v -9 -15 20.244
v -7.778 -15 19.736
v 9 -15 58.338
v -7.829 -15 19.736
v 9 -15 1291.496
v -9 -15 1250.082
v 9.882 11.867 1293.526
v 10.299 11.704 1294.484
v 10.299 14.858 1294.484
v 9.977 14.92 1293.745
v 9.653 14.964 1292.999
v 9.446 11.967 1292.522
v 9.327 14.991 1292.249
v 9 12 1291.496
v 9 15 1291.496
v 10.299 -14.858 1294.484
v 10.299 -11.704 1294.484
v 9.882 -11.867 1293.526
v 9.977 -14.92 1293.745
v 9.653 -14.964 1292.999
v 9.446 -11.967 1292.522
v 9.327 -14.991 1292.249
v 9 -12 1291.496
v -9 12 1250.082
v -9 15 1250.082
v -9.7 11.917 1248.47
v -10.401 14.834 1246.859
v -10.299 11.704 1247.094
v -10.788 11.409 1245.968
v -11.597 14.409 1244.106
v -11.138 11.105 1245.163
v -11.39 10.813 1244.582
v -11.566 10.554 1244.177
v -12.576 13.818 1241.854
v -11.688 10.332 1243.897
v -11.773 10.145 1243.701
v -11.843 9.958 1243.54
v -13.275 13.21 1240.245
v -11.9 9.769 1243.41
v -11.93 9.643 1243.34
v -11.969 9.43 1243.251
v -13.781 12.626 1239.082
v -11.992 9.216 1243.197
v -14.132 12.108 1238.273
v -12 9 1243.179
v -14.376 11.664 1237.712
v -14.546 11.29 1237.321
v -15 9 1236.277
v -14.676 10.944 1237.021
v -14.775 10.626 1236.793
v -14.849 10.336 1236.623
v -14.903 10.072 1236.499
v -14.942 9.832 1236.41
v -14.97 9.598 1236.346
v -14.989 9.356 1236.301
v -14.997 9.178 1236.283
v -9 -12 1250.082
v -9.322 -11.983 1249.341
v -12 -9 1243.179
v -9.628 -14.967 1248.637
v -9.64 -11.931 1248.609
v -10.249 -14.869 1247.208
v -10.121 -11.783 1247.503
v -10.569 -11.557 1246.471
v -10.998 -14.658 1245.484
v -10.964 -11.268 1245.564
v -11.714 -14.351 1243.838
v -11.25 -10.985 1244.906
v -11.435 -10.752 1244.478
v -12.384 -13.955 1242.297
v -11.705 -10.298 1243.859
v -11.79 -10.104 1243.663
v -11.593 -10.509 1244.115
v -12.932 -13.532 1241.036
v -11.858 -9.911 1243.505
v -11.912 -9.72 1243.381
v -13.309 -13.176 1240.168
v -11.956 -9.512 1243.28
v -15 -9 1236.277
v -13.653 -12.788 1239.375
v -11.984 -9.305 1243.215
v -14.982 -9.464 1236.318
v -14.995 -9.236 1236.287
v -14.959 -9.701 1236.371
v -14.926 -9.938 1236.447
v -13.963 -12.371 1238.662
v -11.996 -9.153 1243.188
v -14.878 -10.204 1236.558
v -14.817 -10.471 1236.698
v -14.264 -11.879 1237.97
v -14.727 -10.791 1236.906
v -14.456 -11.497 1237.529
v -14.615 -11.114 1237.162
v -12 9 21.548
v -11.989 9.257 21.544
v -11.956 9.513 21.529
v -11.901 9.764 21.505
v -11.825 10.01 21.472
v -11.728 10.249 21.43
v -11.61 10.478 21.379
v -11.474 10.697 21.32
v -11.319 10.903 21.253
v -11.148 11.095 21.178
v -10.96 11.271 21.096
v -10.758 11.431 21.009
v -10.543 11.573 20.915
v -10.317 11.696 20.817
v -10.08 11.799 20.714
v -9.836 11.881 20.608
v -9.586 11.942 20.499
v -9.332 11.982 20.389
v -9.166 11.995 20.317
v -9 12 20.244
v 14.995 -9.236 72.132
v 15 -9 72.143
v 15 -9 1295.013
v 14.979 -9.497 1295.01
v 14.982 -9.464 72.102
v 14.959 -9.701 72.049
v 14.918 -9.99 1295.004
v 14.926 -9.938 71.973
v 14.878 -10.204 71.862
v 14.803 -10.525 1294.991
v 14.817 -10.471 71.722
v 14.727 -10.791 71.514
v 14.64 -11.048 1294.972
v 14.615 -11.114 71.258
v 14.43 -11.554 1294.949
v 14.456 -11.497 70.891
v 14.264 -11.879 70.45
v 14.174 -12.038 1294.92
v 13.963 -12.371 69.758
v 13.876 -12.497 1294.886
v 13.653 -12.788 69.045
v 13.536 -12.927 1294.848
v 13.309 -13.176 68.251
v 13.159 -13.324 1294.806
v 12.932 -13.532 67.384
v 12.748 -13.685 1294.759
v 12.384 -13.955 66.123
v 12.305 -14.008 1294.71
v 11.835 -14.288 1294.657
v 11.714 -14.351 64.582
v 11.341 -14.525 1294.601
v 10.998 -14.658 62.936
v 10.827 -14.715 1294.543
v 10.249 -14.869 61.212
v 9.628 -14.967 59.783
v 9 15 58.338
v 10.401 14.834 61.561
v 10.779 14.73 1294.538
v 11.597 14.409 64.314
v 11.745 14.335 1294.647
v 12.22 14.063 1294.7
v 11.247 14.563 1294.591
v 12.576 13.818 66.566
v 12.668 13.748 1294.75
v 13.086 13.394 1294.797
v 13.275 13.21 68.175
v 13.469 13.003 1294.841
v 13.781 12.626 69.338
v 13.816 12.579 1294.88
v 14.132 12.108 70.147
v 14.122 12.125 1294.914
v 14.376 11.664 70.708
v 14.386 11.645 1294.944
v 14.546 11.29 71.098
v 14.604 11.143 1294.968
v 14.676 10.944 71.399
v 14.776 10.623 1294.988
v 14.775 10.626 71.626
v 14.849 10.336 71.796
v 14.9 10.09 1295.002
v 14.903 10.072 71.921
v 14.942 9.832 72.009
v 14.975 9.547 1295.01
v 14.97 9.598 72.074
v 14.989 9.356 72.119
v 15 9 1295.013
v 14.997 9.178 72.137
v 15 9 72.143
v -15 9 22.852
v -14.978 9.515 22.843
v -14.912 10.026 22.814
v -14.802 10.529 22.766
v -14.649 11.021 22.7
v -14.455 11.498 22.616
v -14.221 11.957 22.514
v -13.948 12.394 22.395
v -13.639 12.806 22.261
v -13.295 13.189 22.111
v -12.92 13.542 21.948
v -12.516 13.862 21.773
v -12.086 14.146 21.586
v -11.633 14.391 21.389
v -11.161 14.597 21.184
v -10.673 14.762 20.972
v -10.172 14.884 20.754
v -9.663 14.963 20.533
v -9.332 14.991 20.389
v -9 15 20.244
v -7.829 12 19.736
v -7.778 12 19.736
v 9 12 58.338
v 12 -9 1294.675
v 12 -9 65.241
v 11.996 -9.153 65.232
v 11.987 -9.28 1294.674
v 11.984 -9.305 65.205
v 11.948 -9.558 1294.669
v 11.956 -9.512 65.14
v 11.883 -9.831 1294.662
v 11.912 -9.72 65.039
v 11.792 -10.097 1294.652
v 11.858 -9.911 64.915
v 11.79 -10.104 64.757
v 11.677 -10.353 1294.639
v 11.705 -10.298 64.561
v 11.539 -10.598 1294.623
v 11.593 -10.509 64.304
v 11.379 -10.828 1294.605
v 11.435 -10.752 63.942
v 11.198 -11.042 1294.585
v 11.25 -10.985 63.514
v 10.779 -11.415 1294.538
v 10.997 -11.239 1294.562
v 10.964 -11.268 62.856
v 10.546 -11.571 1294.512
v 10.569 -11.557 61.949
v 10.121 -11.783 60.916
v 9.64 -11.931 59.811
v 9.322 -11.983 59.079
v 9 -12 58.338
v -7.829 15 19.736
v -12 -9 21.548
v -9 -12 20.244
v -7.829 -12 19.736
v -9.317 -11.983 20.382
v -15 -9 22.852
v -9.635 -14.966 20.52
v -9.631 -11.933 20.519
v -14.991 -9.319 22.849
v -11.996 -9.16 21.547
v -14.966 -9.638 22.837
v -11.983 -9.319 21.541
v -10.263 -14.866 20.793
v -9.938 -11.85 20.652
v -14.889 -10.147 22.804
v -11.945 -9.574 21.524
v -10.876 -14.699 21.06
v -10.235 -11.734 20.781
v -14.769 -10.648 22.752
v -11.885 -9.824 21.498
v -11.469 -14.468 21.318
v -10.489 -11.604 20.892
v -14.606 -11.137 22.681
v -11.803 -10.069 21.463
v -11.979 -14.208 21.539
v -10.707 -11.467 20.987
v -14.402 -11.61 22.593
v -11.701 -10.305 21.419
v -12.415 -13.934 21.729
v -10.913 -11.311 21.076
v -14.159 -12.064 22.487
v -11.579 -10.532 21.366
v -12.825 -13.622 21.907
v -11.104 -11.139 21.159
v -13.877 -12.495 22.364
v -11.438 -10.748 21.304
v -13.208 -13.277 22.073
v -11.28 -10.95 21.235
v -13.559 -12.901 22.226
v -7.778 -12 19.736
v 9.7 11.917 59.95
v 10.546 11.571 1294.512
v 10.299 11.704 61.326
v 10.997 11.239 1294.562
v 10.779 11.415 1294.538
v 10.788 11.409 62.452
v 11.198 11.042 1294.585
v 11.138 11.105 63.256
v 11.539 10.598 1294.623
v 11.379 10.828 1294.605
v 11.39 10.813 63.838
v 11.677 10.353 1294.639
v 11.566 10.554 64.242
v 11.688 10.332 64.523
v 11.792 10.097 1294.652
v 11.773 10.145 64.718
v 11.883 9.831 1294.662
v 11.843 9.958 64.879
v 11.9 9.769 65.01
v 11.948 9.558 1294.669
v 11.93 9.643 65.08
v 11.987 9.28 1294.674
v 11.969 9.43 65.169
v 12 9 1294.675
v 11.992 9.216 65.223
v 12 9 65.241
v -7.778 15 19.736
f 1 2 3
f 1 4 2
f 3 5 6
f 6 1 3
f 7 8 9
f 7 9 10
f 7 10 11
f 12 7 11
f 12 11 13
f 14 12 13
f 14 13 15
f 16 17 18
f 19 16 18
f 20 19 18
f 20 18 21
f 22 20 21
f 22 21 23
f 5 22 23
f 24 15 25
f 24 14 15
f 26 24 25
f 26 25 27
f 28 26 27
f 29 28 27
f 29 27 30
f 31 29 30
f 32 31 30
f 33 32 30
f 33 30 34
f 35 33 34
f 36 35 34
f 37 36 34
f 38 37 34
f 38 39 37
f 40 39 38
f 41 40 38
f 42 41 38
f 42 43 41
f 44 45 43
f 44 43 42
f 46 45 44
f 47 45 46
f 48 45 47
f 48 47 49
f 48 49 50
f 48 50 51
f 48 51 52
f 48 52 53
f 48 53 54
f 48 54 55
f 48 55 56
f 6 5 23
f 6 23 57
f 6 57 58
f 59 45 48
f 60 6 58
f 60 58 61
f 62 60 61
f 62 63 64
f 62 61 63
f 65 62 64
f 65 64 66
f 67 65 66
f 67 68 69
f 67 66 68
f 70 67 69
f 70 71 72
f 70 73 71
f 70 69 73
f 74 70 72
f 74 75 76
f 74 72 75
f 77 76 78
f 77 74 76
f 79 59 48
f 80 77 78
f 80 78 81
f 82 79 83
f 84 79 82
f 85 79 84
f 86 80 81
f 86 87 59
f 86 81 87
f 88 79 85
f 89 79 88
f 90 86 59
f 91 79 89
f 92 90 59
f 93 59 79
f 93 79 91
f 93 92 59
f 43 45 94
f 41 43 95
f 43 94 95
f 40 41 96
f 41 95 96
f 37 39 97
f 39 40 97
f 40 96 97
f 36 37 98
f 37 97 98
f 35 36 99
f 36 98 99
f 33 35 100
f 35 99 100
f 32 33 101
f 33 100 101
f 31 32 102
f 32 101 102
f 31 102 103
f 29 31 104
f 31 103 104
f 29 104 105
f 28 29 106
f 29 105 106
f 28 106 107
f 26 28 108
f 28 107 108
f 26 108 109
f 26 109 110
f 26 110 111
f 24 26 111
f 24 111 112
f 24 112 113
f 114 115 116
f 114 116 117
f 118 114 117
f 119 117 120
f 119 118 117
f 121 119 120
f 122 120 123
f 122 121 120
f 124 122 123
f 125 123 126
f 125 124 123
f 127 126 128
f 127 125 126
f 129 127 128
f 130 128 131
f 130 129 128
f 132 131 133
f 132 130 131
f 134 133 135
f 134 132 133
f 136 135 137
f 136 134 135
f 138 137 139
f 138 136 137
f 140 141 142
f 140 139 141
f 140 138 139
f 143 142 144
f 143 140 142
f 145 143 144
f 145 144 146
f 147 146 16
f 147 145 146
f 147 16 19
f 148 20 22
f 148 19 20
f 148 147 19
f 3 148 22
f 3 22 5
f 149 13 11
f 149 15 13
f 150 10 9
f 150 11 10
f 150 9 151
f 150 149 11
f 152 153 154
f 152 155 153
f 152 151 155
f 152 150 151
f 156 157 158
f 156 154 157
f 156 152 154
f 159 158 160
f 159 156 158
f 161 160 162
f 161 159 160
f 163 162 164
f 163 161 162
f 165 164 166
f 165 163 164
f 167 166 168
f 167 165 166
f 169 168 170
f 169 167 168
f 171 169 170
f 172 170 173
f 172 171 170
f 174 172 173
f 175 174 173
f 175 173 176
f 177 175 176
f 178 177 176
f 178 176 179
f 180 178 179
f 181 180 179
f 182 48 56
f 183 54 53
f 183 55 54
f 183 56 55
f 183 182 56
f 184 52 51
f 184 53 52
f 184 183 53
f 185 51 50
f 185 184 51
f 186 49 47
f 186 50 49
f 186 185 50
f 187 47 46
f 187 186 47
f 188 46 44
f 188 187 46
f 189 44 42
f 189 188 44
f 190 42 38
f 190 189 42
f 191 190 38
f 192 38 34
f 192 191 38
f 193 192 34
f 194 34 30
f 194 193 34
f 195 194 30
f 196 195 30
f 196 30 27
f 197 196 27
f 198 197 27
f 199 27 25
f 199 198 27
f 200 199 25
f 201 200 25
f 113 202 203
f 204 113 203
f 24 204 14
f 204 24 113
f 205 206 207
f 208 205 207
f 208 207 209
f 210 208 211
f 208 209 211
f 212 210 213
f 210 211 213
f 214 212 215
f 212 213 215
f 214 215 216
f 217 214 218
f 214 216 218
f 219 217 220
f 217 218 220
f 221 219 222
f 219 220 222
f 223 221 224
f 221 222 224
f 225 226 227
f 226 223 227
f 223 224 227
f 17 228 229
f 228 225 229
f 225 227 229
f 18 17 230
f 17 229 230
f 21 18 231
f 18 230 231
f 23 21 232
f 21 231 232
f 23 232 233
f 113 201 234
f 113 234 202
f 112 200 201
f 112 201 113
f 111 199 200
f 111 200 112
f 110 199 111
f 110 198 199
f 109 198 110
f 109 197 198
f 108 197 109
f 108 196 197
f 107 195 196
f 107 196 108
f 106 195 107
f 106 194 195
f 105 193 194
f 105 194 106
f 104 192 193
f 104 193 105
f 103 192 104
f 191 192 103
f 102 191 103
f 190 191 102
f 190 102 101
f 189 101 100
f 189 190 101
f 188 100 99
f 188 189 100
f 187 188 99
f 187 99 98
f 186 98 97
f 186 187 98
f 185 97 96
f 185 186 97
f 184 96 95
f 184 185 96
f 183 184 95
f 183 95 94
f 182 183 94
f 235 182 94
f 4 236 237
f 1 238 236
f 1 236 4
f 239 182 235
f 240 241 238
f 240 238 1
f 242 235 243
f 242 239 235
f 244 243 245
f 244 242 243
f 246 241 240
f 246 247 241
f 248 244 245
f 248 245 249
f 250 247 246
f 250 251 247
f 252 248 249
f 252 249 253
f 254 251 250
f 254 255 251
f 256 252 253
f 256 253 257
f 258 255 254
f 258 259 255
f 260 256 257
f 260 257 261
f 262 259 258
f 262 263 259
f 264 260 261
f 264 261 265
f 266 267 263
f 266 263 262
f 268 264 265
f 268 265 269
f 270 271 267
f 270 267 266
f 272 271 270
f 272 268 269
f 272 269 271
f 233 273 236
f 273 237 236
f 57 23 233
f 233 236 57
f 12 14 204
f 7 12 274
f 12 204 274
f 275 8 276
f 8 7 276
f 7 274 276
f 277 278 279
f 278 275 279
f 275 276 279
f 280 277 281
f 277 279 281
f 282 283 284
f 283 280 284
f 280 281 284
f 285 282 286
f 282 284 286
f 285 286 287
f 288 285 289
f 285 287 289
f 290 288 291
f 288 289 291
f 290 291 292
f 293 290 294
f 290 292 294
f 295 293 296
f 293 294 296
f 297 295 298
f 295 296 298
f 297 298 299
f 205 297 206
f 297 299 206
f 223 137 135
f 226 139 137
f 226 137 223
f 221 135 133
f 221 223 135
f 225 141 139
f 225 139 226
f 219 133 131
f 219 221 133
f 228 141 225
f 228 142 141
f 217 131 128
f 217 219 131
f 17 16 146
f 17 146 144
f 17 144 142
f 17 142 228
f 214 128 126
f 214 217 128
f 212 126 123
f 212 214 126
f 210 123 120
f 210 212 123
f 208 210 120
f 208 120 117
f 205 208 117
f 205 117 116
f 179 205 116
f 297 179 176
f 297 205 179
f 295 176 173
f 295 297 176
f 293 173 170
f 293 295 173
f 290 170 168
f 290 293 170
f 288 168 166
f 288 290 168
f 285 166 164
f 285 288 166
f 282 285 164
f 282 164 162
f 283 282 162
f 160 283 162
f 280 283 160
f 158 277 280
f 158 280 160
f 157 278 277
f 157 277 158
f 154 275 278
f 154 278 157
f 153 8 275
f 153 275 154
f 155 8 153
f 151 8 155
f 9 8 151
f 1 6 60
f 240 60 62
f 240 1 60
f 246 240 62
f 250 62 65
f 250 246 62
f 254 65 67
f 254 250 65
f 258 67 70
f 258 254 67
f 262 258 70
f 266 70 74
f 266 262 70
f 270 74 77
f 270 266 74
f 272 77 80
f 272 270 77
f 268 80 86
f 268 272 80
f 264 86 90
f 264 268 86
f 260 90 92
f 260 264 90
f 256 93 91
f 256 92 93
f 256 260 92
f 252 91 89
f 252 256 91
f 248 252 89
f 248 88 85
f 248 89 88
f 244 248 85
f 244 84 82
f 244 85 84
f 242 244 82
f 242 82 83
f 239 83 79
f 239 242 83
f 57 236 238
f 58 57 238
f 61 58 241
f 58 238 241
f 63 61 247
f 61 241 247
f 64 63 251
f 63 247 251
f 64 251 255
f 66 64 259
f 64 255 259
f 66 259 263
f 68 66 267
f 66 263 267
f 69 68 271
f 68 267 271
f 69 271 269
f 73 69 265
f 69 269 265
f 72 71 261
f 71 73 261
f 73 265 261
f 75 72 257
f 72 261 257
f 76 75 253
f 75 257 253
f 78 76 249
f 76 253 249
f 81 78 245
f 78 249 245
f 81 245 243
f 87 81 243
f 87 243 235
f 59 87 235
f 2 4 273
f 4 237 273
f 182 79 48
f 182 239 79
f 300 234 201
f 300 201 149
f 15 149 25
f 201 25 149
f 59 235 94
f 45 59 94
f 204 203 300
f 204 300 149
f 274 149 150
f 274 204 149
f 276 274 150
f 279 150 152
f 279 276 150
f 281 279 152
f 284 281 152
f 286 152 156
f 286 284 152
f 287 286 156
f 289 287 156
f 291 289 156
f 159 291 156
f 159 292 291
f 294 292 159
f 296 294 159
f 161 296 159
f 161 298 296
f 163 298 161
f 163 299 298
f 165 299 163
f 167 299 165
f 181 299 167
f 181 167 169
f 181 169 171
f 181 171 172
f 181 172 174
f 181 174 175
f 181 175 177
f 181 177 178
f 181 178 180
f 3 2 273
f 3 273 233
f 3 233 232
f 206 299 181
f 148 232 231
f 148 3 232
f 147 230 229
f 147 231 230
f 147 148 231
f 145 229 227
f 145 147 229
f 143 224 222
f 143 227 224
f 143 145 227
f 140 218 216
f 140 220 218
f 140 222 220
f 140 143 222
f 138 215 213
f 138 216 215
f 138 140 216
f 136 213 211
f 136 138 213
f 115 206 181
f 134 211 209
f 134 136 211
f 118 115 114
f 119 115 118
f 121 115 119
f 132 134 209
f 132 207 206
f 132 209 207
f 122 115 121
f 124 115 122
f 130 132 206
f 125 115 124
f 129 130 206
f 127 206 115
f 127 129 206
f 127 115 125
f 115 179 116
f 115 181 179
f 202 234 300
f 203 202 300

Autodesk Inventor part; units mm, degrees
ref_plane "Start Plane" through (0, 0, 19.7356) normal (0, 0, 1) x (1, 0, 0)
ref_plane "End Plane" through (0, 0, 1295.0132) normal (0, 0, 1) x (1, 0, 0)
sketch "Sketch" plane through (0, 0, 0) normal (0, 0, 1) x (1, 0, 0)
  line L0 (-15, -9) -> (-15, 9)
  line L1 (-9, 15) -> (9, 15)
  line L2 (15, 9) -> (15, -9)
  line L3 (9, -15) -> (-9, -15)
  arc A0 (-15, -9) -> (-9, -15) centre (-9, -9) ccw
  arc A1 (-9, 15) -> (-15, 9) centre (-9, 9) ccw
  arc A2 (15, 9) -> (9, 15) centre (9, 9) ccw
  arc A3 (9, -15) -> (15, -9) centre (9, -9) ccw
  arc A4 (-9, 12) -> (-12, 9) centre (-9, 9) ccw
  line L4 (-9, 12) -> (9, 12)
  arc A5 (12, 9) -> (9, 12) centre (9, 9) ccw
  line L5 (12, 9) -> (12, -9)
  arc A6 (9, -12) -> (12, -9) centre (9, -9) ccw
  line L6 (9, -12) -> (-9, -12)
  arc A7 (-12, -9) -> (-9, -12) centre (-9, -9) ccw
  line L7 (-12, -9) -> (-12, 9)
  line L8 (0, 22.7397) -> (0, -22.7397) construction
  line L9 (-22.7397, 0) -> (22.7397, 0) construction
  dimension "d7" = 6
  dimension "d10" = 30
  dimension "d11" = 30
  dimension "d12" = 3
  dimension "d15" = 15
  dimension "d16" = 15
extrude "Body" add sketch "Sketch" along normal up to surface (1275.2776 mm away) from surface at 19.7356
sketch "Sketch3" plane through (0, 0, 0) normal (0, 0, 1) x (1, 0, 0)
  line L0 (0, 0) -> (10, 0)
ref_plane "Work Plane3" through (0, 0, 0) normal (0, -1, 0) x (1, 0, 0)
ref_plane "Work Plane4" through (-472.3083, -9, 221.6126) normal (-0.3986, 0, -0.9171) x (-0.9171, 0, 0.3986)
split "Split1" plane through (-472.3083, -9, 221.6126) removes the side toward (-0.3986, 0, -0.9171)
ref_plane "Work Plane5" through (-13.7571, -9, 5.9786) normal (0.9171, 0, -0.3986) x (-0.3986, 0, -0.9171)
split "Split2" plane through (-13.7571, -9, 5.9786) removes the side toward (0.9171, 0, -0.3986)
ref_plane "Work Plane6" through (13.7571, -9, 1302.4412) normal (-0.9171, 0, 0.3986) x (0.3986, 0, 0.9171)
split "Split3" plane through (13.7571, -9, 1302.4412) removes the side toward (-0.9171, 0, 0.3986)
ref_plane "Work Plane7" through (1.6776, 9, 1293.5139) normal (-0.1118, 0, 0.9937) x (0.9937, 0, 0.1118)
split "Split4" plane through (1.6776, 9, 1293.5139) removes the side toward (-0.1118, 0, 0.9937)
sketch "Sketch4" plane through (0, 0, 0) normal (0, -1, 0) x (1, 0, 0)
  line L0 (-2, 19.7356) -> (12, 19.7356) projected
  line L1 (-2, 1295.0132) -> (12, 1295.0132) projected
  dimension "d18" = 1275.2776
equation "\"d7\" = G_IR"
equation "\"d10\" = G_H"
equation "\"d11\" = G_W"
equation "\"d12\" = G_T"
equation "\"d15\" = 0.5 * d10"
equation "\"d16\" = 0.5 * d11"
equation "\"d3\" = G_L"
equation "\"G_W\" = 30"
equation "\"G_H\" = 30"
equation "\"G_T\" = 3"
equation "\"G_IR\" = 6"
equation "\"G_L\" = d18"
equation "\"G_OFFSET_START\" = -19.73564"
equation "\"G_OFFSET_END\" = -13.40653"
equation "\"d13\" = -G_OFFSET_START"
equation "\"d14\" = G_OFFSET_END + B_L"
equation "\"B_L\" = 1308.41975"
properties part number "DIN EN 10219-2 - 30 x 30 x 3  - 1275.28" material "Steel, Mild"
